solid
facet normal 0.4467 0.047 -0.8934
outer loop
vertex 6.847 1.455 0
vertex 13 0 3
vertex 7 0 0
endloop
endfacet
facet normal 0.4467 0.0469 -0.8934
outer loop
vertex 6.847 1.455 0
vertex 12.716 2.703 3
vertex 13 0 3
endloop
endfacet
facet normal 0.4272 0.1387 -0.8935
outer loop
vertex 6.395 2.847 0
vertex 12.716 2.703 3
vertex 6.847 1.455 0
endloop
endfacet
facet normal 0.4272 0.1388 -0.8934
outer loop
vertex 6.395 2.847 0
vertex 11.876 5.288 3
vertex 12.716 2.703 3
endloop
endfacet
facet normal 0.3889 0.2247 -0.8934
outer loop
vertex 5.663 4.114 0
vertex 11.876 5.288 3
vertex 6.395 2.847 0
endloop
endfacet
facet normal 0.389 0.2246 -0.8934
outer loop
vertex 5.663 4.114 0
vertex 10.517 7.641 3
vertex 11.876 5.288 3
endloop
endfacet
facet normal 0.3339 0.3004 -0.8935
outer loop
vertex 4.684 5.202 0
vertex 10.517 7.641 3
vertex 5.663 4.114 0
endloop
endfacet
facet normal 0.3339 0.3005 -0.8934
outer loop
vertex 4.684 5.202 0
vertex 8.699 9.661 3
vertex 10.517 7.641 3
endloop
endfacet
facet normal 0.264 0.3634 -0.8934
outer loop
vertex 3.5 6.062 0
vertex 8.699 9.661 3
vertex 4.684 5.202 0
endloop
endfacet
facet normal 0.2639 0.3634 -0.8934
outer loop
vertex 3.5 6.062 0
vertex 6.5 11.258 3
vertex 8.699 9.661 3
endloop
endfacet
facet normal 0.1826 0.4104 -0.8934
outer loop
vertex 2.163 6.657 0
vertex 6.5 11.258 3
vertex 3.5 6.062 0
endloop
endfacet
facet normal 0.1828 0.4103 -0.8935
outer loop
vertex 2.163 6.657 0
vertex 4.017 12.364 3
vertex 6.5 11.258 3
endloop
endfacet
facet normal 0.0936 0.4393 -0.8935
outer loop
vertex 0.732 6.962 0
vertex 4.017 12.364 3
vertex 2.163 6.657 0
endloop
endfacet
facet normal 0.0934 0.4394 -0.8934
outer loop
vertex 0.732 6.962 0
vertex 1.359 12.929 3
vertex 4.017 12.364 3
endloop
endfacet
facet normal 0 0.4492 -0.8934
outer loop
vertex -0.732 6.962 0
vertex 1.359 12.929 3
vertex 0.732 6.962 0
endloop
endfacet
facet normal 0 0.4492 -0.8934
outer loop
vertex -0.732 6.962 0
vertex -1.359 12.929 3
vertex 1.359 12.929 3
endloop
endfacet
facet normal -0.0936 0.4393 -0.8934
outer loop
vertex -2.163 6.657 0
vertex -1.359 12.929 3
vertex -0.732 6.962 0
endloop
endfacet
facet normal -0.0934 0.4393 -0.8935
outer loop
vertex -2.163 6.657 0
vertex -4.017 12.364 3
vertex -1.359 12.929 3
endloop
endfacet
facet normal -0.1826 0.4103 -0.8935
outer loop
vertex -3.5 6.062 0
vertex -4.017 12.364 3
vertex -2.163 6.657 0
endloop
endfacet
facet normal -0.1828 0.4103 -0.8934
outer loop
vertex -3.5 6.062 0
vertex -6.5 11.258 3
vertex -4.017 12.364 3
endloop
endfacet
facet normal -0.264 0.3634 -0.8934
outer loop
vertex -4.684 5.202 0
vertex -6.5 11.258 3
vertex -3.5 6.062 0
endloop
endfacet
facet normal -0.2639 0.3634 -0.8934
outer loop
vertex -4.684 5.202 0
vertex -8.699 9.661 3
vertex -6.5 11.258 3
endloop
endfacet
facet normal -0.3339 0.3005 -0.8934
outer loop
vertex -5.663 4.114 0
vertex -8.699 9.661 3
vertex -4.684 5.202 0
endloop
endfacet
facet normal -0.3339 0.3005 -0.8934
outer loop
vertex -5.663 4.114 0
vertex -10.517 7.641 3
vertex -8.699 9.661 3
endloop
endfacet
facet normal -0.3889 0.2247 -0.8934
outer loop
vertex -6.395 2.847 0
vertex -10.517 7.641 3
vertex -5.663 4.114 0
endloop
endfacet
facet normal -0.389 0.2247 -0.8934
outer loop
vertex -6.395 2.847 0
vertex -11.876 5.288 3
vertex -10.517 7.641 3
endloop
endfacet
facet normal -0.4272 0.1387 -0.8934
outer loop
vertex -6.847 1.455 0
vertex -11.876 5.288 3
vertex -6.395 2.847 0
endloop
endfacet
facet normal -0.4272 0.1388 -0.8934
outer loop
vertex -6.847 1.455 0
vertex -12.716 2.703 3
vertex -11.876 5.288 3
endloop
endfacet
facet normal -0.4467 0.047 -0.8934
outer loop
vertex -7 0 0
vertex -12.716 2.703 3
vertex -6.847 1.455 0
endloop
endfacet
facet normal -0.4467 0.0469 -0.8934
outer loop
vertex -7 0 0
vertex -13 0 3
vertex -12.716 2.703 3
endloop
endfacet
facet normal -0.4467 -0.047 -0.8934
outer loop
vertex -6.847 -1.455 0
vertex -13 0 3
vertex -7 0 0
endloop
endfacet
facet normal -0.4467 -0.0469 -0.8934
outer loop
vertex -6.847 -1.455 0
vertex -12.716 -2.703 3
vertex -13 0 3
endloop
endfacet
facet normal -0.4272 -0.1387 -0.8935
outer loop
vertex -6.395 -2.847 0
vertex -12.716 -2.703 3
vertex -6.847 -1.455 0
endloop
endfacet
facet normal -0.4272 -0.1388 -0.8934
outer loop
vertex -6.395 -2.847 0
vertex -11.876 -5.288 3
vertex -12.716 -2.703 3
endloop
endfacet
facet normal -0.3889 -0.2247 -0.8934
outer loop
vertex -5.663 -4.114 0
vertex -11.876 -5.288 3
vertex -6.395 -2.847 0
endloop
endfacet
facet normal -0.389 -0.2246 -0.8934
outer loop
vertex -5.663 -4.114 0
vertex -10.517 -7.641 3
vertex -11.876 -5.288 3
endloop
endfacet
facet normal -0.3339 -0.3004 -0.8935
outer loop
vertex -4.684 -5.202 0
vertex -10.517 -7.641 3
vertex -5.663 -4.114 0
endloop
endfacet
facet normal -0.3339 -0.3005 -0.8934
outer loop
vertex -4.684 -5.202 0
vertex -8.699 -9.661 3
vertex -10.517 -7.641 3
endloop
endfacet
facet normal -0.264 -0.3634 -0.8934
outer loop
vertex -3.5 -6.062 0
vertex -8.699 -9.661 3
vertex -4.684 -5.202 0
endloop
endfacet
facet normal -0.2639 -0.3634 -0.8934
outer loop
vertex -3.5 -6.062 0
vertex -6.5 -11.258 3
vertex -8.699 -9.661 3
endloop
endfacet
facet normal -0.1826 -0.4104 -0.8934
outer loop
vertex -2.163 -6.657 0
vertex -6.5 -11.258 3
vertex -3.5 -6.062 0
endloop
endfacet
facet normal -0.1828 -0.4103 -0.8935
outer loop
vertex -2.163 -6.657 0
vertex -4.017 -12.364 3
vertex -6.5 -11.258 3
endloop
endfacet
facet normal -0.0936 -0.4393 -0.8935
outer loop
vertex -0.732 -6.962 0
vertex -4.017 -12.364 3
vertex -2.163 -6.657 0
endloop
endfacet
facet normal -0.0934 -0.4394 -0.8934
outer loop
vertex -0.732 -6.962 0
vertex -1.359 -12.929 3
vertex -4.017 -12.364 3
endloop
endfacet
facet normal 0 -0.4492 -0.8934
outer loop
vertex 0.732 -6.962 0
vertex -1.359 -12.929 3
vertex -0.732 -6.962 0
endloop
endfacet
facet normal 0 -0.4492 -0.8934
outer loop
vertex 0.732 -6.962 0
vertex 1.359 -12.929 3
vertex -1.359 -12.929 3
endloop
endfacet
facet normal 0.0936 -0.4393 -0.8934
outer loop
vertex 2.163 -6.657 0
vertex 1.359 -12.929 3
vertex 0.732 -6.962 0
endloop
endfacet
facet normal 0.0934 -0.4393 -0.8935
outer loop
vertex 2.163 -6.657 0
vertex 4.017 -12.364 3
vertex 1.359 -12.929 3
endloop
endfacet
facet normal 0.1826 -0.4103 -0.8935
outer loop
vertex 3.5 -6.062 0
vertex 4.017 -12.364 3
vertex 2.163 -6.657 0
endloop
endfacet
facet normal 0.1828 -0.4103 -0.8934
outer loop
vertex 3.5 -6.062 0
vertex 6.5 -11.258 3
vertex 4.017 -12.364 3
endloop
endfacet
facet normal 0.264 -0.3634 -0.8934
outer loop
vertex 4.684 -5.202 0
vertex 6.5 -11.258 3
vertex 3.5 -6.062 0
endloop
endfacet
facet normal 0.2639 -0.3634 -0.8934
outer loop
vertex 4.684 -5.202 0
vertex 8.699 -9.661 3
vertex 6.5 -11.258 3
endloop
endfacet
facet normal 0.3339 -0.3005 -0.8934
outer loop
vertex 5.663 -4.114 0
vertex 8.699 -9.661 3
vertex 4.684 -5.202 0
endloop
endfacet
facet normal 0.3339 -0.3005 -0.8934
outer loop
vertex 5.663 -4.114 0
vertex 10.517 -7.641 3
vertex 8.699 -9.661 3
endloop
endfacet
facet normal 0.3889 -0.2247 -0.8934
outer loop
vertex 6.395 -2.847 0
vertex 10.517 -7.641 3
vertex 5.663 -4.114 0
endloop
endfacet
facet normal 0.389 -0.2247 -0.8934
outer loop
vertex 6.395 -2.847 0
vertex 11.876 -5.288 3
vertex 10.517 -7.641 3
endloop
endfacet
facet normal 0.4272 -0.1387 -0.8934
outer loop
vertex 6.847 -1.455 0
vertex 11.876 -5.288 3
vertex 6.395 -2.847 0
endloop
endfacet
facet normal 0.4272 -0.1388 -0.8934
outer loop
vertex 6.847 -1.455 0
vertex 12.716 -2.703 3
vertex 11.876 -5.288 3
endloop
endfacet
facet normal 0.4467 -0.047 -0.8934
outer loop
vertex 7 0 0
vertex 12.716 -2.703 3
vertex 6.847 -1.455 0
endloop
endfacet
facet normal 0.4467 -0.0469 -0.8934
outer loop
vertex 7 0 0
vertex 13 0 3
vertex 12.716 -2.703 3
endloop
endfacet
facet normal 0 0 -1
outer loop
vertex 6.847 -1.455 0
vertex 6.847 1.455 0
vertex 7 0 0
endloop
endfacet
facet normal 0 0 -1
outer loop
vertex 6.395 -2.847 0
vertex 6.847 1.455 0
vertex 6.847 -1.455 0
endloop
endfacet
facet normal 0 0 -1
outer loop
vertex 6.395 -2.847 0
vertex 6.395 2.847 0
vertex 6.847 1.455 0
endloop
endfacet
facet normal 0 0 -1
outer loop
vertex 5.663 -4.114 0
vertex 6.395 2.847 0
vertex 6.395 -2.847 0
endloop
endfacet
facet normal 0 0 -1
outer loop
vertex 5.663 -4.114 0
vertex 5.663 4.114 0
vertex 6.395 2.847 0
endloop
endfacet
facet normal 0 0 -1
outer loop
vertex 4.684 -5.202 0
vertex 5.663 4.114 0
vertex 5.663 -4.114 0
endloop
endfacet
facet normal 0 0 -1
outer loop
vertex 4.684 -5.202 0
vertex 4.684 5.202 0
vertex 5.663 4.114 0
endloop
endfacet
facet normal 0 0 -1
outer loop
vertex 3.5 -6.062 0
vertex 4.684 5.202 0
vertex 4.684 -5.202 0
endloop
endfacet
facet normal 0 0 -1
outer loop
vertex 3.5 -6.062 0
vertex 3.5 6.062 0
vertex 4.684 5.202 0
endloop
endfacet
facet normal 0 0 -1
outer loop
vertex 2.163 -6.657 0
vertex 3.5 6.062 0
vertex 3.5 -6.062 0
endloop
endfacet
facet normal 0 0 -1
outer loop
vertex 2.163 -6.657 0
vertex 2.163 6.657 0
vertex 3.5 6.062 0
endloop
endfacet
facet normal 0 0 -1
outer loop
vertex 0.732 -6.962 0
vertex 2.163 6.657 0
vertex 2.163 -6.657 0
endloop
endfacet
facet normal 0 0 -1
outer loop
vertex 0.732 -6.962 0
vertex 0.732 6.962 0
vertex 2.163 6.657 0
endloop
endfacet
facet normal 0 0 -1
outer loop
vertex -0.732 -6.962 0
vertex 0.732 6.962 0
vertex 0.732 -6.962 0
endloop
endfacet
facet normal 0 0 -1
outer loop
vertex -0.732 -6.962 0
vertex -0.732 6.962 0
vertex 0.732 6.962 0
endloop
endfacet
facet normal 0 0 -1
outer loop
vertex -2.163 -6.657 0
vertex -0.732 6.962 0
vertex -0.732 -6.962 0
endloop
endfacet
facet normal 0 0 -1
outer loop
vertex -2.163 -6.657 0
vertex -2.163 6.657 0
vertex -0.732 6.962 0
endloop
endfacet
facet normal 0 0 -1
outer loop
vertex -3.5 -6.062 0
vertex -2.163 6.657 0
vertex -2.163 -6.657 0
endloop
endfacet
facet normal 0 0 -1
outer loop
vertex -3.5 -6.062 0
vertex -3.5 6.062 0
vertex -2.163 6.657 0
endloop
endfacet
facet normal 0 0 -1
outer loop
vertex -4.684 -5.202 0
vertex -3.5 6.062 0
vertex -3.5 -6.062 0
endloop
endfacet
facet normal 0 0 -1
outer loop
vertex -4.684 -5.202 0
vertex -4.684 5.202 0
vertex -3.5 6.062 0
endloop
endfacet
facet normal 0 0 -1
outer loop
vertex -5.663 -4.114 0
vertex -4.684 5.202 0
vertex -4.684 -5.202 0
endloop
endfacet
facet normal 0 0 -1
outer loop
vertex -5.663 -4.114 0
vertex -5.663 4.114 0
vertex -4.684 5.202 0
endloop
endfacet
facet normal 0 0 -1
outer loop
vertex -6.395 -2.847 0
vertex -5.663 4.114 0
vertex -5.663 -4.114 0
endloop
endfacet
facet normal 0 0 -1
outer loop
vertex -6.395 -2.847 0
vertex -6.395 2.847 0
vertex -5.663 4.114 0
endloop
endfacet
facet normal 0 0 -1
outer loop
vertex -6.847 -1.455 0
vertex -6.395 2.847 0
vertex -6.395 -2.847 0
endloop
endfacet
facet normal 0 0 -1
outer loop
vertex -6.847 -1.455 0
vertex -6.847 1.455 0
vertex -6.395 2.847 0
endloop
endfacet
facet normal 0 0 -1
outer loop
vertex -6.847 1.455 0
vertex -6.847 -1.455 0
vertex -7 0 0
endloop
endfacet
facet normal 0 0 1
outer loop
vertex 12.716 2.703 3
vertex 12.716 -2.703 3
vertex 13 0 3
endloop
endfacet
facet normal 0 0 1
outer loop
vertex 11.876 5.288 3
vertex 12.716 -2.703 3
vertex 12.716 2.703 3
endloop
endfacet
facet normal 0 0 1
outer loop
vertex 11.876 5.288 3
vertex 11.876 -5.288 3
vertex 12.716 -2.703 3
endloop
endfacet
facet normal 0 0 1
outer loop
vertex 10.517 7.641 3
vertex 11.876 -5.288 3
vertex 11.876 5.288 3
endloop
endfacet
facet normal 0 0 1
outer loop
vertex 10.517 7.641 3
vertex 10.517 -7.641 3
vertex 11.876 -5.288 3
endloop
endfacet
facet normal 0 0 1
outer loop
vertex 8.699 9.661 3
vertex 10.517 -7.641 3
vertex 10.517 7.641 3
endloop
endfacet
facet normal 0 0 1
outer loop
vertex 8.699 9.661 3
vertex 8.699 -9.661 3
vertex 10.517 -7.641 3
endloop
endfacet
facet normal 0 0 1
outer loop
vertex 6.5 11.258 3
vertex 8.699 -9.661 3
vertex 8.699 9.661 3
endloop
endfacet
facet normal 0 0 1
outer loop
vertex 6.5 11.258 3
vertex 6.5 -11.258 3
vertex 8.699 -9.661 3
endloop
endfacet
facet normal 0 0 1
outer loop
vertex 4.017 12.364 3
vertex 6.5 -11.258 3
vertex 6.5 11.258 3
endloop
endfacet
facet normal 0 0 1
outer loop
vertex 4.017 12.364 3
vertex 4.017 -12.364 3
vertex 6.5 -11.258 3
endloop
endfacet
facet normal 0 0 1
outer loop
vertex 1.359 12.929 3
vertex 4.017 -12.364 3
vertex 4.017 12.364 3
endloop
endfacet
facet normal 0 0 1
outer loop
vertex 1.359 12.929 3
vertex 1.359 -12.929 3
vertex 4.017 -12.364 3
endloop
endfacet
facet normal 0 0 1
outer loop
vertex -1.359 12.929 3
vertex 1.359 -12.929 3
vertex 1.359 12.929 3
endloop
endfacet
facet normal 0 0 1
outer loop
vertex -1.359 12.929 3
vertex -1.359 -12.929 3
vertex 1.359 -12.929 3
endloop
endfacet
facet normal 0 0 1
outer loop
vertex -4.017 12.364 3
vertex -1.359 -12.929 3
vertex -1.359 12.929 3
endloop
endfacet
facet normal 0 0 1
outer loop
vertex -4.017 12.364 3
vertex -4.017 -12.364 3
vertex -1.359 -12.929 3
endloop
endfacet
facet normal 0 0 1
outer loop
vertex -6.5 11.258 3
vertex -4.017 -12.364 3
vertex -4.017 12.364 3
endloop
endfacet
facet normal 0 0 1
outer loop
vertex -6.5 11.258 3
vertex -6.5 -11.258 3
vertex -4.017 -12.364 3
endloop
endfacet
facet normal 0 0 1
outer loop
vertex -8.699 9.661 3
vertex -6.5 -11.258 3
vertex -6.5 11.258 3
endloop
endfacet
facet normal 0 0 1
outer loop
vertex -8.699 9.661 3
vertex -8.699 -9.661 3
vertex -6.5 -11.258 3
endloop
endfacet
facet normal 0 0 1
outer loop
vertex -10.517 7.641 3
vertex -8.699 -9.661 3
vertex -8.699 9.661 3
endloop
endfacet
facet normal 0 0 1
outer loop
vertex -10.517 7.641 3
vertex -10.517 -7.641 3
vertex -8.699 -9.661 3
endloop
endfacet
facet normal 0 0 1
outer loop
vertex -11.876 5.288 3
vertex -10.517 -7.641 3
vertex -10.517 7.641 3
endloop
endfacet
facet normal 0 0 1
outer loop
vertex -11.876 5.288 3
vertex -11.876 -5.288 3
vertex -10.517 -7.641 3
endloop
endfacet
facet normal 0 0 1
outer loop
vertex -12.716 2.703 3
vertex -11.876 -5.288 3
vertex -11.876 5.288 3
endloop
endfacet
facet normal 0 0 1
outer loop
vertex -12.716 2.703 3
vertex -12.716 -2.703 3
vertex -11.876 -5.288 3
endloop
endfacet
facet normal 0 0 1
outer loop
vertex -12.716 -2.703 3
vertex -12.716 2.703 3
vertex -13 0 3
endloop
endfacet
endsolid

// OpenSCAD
// Generated by SolidPython 1.0.1 on 2020-07-29 00:02:42


cylinder(h = 3, r1 = 7, r2 = 13);
/***********************************************
*********      SolidPython code:      **********
************************************************
 
# import packages: SolidPython
from solid import *
from solid.utils import *
from itertools import chain, combinations


class Resize:

    def __init__(self, scad_file):
        self.scad_file = scad_file
        #self.scad_file = import_scad(scad_file)
        # cone/cylinder param:
        self.r1 = 0
        self.r2 = 0
        self.h = 0
        # rectangular prism param:
        self.w = 0
        self.l = 0
        # ellipse param:
        self.r = 0

    # import OpenScad code (file name corresponds to shape)


    # classify shape + parameters
    def assign(self, param1, param2, param3):
        if self.scad_file == 'cone.scad':
            self.r1 = param1
            self.r2 = param2
            self.h = param3
        elif self.scad_file == 'cylinder.scad':
            self.r1 = param1
            self.r2 = param2
            self.h = param3
        elif self.scad_file == 'rectangularPrism.scad':
            self.h = param1
            self.l = param2
            self.w = param3
        else:
            self.r = param1
            self.h = param2

    # resize parameters
    def iterate(self):
        x = range(3, 20, 2)
        i = 1
        if self.scad_file == 'cone.scad':
            tempList = list(combinations(x, 3))
            #print(tempList)
            for i in x:
                for j in range (3):
                    param1 = tempList[i][0]
                    param2 = tempList[i][1]
                    param3 = tempList[i][2]
                    filepath = 'produced_scad_files/' + 'cone' + str(param1) + '_' + str(param2) + '_' + str(param3) + '.scad'
                    scad_render_to_file(cylinder(h=param1, r1=param2, r2=param3), filepath)

        elif self.scad_file == 'cylinder.scad':
            tempList = list(combinations(x, 3))
            for i in x:
                for j in range(3):
                    param1 = tempList[i][0]
                    param2 = tempList[i][1]
                    param3 = tempList[i][2]
                    filepath = 'produced_scad_files/' + 'cylinder' + str(param1) + '_' + str(param2) + '_' + str(param3) + '.scad'
                    scad_render_to_file(cylinder(h=param1, r1=param2, r2=param3), filepath)

        elif self.scad_file == 'rectangularPrism.scad':
            tempList = list(combinations(x, 3))
            for i in x:
                for j in range(3):
                    param1 = tempList[i][0]
                    param2 = tempList[i][1]
                    param3 = tempList[i][2]
                    filepath = 'produced_scad_files/' + 'rectangularPrism' + str(param1) + '_' + str(param2) + '_' + str(
                        param3) + '.scad'
                    scad_render_to_file(cube(size=(param1, param2, param3)), filepath)

        else:
            tempList = list(combinations(x, 2))
            for i in x:
                for j in range(3):
                    param1 = tempList[i][0]
                    param2 = tempList[i][1]
                    filepath = 'produced_scad_files/' + 'ellipse' + str(param1) + '_' + str(param2) + '_' + '.scad'
                    scad_render_to_file(sphere(param1, param2), filepath)

    def render_to_scadfile(self):
        scad_render_to_file(scad, 'example.scad') 
 
************************************************/
